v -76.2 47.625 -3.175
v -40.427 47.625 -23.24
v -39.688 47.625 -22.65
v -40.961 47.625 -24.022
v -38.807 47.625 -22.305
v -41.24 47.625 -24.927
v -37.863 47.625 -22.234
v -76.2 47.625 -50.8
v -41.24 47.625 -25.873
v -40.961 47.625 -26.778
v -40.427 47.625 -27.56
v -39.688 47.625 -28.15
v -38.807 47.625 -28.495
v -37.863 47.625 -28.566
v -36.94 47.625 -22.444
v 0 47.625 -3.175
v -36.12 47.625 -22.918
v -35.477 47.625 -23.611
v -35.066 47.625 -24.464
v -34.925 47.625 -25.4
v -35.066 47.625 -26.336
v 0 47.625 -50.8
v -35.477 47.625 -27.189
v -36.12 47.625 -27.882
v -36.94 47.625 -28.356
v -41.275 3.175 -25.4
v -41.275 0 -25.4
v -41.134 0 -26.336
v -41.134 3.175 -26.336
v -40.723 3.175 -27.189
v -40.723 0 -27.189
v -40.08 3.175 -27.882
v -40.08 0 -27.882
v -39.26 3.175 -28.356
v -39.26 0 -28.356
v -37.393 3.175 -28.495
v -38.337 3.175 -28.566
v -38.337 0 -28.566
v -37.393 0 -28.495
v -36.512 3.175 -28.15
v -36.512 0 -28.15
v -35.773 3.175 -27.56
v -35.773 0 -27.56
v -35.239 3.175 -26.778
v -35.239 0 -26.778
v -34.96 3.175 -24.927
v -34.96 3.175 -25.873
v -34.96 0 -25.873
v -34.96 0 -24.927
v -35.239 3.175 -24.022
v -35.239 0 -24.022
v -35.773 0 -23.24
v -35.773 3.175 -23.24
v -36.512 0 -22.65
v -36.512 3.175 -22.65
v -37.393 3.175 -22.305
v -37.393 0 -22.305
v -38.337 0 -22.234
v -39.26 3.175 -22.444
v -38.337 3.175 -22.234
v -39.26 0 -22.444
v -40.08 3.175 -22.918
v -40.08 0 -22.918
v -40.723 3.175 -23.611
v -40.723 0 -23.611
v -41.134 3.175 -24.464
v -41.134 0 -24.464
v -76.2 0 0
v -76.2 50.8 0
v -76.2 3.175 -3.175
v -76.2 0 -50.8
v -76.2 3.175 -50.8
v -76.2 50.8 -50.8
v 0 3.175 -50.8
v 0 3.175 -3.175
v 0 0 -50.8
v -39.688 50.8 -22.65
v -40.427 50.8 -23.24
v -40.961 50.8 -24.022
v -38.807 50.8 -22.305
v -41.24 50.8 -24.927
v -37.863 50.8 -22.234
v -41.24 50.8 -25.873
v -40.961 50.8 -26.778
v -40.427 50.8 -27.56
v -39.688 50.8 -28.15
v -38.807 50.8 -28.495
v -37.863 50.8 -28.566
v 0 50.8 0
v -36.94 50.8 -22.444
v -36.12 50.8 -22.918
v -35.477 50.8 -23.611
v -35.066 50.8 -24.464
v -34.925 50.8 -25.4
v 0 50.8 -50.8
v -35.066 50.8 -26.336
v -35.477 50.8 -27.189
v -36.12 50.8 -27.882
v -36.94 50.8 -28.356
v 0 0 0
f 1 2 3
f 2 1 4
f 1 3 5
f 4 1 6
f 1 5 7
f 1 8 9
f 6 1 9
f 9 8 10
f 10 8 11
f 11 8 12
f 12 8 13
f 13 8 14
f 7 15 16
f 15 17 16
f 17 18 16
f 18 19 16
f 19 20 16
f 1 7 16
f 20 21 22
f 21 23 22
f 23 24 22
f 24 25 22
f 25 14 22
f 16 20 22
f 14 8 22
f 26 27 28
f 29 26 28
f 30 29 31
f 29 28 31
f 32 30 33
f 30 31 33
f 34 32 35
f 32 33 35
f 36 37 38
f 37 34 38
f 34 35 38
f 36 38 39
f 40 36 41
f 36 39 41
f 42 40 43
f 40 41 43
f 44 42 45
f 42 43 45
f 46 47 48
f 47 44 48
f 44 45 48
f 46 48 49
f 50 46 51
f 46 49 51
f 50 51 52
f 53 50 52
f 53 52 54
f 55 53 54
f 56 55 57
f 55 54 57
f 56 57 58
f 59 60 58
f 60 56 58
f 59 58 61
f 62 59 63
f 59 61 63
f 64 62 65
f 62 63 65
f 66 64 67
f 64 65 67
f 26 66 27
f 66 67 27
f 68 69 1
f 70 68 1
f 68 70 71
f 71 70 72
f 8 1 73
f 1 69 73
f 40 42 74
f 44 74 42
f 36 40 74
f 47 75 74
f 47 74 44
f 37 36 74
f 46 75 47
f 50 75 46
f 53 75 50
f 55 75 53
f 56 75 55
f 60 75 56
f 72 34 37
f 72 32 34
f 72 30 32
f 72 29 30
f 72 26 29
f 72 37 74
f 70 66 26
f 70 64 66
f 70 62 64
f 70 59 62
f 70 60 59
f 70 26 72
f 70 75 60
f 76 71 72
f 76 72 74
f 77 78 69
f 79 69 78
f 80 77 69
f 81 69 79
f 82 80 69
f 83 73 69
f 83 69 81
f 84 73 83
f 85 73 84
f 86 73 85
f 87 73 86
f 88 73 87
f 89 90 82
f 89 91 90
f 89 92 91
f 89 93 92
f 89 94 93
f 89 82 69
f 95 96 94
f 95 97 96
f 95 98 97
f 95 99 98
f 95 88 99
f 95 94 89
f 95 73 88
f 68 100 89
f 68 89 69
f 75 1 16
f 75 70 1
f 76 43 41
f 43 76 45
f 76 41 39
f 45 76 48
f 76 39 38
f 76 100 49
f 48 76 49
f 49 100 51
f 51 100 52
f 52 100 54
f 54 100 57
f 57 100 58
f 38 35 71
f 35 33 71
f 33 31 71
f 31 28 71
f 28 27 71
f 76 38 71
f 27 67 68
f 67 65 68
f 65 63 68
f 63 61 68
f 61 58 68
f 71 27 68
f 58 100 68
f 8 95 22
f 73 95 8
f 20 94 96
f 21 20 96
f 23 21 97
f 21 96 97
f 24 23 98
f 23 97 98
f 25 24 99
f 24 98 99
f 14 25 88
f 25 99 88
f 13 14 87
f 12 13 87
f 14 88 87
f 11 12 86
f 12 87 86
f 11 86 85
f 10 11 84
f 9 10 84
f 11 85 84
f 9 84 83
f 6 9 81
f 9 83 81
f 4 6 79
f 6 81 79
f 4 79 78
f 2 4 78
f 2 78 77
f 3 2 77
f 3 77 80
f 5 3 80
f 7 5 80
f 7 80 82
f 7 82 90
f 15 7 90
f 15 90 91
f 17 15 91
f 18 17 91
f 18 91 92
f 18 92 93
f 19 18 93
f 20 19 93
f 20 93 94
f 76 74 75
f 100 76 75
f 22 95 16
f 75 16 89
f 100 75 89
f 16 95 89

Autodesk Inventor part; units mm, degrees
ref_plane "YZ Plane" through (0, 0, 0) normal (1, 0, 0) x (0, 1, 0)
ref_plane "XZ Plane" through (0, 0, 0) normal (0, 1, 0) x (-1, 0, 0)
ref_plane "XY Plane" through (0, 0, 0) normal (0, 0, 1) x (1, 0, 0)
sketch "Sketch1" plane through (0, 0, 0) normal (0, 1, 0) x (-1, 0, 0)
  line L0 (0, 0) -> (76.2, 0)
  line L1 (76.2, 0) -> (76.2, -50.8)
  line L2 (76.2, -50.8) -> (0, -50.8)
  line L3 (0, -50.8) -> (0, 0)
  line L4 (76.2, -3.175) -> (0, -3.175)
  circle A0 centre (38.1, -25.4) radius 3.175
  dimension "d0" = 76.2
  dimension "d1" = 50.8
  dimension "d2" = 3.175
  dimension "d9" = 6.35
  dimension "d10" = 38.1
  dimension "d11" = 25.4
extrude "Extrusion1" add sketch "Sketch1" along normal blind 3.175 contours L4 L1 L2 L3
extrude "Extrusion2" add sketch "Sketch1" along normal blind 50.8 contours L0 L1 L4 L3
sketch "Sketch2" plane through (0, 50.8, 0) normal (0, 1, 0) x (1, 0, 0)
  line L0 (0, 50.8) -> (-76.2, 50.8) projected
  line L1 (0, 0) -> (-76.2, 0)
  line L2 (-76.2, 0) -> (-76.2, 50.8)
  line L3 (-76.2, 50.8) -> (0, 50.8)
  line L4 (0, 50.8) -> (0, 0)
  line L5 (-76.2, 50.8) -> (-76.2, 3.175) projected
  line L6 (0, 3.175) -> (0, 50.8) projected
  line L7 (-76.2, 3.175) -> (0, 3.175)
  circle A0 centre (-38.1, 25.4) radius 3.175 projected
  circle A1 centre (-38.1, 25.4) radius 3.175
  dimension "d12" = 6.35
extrude "Extrusion3" add sketch "Sketch2" against normal blind 3.175 contours L4 L7 L2 L0
properties part number "Gear Shell"
